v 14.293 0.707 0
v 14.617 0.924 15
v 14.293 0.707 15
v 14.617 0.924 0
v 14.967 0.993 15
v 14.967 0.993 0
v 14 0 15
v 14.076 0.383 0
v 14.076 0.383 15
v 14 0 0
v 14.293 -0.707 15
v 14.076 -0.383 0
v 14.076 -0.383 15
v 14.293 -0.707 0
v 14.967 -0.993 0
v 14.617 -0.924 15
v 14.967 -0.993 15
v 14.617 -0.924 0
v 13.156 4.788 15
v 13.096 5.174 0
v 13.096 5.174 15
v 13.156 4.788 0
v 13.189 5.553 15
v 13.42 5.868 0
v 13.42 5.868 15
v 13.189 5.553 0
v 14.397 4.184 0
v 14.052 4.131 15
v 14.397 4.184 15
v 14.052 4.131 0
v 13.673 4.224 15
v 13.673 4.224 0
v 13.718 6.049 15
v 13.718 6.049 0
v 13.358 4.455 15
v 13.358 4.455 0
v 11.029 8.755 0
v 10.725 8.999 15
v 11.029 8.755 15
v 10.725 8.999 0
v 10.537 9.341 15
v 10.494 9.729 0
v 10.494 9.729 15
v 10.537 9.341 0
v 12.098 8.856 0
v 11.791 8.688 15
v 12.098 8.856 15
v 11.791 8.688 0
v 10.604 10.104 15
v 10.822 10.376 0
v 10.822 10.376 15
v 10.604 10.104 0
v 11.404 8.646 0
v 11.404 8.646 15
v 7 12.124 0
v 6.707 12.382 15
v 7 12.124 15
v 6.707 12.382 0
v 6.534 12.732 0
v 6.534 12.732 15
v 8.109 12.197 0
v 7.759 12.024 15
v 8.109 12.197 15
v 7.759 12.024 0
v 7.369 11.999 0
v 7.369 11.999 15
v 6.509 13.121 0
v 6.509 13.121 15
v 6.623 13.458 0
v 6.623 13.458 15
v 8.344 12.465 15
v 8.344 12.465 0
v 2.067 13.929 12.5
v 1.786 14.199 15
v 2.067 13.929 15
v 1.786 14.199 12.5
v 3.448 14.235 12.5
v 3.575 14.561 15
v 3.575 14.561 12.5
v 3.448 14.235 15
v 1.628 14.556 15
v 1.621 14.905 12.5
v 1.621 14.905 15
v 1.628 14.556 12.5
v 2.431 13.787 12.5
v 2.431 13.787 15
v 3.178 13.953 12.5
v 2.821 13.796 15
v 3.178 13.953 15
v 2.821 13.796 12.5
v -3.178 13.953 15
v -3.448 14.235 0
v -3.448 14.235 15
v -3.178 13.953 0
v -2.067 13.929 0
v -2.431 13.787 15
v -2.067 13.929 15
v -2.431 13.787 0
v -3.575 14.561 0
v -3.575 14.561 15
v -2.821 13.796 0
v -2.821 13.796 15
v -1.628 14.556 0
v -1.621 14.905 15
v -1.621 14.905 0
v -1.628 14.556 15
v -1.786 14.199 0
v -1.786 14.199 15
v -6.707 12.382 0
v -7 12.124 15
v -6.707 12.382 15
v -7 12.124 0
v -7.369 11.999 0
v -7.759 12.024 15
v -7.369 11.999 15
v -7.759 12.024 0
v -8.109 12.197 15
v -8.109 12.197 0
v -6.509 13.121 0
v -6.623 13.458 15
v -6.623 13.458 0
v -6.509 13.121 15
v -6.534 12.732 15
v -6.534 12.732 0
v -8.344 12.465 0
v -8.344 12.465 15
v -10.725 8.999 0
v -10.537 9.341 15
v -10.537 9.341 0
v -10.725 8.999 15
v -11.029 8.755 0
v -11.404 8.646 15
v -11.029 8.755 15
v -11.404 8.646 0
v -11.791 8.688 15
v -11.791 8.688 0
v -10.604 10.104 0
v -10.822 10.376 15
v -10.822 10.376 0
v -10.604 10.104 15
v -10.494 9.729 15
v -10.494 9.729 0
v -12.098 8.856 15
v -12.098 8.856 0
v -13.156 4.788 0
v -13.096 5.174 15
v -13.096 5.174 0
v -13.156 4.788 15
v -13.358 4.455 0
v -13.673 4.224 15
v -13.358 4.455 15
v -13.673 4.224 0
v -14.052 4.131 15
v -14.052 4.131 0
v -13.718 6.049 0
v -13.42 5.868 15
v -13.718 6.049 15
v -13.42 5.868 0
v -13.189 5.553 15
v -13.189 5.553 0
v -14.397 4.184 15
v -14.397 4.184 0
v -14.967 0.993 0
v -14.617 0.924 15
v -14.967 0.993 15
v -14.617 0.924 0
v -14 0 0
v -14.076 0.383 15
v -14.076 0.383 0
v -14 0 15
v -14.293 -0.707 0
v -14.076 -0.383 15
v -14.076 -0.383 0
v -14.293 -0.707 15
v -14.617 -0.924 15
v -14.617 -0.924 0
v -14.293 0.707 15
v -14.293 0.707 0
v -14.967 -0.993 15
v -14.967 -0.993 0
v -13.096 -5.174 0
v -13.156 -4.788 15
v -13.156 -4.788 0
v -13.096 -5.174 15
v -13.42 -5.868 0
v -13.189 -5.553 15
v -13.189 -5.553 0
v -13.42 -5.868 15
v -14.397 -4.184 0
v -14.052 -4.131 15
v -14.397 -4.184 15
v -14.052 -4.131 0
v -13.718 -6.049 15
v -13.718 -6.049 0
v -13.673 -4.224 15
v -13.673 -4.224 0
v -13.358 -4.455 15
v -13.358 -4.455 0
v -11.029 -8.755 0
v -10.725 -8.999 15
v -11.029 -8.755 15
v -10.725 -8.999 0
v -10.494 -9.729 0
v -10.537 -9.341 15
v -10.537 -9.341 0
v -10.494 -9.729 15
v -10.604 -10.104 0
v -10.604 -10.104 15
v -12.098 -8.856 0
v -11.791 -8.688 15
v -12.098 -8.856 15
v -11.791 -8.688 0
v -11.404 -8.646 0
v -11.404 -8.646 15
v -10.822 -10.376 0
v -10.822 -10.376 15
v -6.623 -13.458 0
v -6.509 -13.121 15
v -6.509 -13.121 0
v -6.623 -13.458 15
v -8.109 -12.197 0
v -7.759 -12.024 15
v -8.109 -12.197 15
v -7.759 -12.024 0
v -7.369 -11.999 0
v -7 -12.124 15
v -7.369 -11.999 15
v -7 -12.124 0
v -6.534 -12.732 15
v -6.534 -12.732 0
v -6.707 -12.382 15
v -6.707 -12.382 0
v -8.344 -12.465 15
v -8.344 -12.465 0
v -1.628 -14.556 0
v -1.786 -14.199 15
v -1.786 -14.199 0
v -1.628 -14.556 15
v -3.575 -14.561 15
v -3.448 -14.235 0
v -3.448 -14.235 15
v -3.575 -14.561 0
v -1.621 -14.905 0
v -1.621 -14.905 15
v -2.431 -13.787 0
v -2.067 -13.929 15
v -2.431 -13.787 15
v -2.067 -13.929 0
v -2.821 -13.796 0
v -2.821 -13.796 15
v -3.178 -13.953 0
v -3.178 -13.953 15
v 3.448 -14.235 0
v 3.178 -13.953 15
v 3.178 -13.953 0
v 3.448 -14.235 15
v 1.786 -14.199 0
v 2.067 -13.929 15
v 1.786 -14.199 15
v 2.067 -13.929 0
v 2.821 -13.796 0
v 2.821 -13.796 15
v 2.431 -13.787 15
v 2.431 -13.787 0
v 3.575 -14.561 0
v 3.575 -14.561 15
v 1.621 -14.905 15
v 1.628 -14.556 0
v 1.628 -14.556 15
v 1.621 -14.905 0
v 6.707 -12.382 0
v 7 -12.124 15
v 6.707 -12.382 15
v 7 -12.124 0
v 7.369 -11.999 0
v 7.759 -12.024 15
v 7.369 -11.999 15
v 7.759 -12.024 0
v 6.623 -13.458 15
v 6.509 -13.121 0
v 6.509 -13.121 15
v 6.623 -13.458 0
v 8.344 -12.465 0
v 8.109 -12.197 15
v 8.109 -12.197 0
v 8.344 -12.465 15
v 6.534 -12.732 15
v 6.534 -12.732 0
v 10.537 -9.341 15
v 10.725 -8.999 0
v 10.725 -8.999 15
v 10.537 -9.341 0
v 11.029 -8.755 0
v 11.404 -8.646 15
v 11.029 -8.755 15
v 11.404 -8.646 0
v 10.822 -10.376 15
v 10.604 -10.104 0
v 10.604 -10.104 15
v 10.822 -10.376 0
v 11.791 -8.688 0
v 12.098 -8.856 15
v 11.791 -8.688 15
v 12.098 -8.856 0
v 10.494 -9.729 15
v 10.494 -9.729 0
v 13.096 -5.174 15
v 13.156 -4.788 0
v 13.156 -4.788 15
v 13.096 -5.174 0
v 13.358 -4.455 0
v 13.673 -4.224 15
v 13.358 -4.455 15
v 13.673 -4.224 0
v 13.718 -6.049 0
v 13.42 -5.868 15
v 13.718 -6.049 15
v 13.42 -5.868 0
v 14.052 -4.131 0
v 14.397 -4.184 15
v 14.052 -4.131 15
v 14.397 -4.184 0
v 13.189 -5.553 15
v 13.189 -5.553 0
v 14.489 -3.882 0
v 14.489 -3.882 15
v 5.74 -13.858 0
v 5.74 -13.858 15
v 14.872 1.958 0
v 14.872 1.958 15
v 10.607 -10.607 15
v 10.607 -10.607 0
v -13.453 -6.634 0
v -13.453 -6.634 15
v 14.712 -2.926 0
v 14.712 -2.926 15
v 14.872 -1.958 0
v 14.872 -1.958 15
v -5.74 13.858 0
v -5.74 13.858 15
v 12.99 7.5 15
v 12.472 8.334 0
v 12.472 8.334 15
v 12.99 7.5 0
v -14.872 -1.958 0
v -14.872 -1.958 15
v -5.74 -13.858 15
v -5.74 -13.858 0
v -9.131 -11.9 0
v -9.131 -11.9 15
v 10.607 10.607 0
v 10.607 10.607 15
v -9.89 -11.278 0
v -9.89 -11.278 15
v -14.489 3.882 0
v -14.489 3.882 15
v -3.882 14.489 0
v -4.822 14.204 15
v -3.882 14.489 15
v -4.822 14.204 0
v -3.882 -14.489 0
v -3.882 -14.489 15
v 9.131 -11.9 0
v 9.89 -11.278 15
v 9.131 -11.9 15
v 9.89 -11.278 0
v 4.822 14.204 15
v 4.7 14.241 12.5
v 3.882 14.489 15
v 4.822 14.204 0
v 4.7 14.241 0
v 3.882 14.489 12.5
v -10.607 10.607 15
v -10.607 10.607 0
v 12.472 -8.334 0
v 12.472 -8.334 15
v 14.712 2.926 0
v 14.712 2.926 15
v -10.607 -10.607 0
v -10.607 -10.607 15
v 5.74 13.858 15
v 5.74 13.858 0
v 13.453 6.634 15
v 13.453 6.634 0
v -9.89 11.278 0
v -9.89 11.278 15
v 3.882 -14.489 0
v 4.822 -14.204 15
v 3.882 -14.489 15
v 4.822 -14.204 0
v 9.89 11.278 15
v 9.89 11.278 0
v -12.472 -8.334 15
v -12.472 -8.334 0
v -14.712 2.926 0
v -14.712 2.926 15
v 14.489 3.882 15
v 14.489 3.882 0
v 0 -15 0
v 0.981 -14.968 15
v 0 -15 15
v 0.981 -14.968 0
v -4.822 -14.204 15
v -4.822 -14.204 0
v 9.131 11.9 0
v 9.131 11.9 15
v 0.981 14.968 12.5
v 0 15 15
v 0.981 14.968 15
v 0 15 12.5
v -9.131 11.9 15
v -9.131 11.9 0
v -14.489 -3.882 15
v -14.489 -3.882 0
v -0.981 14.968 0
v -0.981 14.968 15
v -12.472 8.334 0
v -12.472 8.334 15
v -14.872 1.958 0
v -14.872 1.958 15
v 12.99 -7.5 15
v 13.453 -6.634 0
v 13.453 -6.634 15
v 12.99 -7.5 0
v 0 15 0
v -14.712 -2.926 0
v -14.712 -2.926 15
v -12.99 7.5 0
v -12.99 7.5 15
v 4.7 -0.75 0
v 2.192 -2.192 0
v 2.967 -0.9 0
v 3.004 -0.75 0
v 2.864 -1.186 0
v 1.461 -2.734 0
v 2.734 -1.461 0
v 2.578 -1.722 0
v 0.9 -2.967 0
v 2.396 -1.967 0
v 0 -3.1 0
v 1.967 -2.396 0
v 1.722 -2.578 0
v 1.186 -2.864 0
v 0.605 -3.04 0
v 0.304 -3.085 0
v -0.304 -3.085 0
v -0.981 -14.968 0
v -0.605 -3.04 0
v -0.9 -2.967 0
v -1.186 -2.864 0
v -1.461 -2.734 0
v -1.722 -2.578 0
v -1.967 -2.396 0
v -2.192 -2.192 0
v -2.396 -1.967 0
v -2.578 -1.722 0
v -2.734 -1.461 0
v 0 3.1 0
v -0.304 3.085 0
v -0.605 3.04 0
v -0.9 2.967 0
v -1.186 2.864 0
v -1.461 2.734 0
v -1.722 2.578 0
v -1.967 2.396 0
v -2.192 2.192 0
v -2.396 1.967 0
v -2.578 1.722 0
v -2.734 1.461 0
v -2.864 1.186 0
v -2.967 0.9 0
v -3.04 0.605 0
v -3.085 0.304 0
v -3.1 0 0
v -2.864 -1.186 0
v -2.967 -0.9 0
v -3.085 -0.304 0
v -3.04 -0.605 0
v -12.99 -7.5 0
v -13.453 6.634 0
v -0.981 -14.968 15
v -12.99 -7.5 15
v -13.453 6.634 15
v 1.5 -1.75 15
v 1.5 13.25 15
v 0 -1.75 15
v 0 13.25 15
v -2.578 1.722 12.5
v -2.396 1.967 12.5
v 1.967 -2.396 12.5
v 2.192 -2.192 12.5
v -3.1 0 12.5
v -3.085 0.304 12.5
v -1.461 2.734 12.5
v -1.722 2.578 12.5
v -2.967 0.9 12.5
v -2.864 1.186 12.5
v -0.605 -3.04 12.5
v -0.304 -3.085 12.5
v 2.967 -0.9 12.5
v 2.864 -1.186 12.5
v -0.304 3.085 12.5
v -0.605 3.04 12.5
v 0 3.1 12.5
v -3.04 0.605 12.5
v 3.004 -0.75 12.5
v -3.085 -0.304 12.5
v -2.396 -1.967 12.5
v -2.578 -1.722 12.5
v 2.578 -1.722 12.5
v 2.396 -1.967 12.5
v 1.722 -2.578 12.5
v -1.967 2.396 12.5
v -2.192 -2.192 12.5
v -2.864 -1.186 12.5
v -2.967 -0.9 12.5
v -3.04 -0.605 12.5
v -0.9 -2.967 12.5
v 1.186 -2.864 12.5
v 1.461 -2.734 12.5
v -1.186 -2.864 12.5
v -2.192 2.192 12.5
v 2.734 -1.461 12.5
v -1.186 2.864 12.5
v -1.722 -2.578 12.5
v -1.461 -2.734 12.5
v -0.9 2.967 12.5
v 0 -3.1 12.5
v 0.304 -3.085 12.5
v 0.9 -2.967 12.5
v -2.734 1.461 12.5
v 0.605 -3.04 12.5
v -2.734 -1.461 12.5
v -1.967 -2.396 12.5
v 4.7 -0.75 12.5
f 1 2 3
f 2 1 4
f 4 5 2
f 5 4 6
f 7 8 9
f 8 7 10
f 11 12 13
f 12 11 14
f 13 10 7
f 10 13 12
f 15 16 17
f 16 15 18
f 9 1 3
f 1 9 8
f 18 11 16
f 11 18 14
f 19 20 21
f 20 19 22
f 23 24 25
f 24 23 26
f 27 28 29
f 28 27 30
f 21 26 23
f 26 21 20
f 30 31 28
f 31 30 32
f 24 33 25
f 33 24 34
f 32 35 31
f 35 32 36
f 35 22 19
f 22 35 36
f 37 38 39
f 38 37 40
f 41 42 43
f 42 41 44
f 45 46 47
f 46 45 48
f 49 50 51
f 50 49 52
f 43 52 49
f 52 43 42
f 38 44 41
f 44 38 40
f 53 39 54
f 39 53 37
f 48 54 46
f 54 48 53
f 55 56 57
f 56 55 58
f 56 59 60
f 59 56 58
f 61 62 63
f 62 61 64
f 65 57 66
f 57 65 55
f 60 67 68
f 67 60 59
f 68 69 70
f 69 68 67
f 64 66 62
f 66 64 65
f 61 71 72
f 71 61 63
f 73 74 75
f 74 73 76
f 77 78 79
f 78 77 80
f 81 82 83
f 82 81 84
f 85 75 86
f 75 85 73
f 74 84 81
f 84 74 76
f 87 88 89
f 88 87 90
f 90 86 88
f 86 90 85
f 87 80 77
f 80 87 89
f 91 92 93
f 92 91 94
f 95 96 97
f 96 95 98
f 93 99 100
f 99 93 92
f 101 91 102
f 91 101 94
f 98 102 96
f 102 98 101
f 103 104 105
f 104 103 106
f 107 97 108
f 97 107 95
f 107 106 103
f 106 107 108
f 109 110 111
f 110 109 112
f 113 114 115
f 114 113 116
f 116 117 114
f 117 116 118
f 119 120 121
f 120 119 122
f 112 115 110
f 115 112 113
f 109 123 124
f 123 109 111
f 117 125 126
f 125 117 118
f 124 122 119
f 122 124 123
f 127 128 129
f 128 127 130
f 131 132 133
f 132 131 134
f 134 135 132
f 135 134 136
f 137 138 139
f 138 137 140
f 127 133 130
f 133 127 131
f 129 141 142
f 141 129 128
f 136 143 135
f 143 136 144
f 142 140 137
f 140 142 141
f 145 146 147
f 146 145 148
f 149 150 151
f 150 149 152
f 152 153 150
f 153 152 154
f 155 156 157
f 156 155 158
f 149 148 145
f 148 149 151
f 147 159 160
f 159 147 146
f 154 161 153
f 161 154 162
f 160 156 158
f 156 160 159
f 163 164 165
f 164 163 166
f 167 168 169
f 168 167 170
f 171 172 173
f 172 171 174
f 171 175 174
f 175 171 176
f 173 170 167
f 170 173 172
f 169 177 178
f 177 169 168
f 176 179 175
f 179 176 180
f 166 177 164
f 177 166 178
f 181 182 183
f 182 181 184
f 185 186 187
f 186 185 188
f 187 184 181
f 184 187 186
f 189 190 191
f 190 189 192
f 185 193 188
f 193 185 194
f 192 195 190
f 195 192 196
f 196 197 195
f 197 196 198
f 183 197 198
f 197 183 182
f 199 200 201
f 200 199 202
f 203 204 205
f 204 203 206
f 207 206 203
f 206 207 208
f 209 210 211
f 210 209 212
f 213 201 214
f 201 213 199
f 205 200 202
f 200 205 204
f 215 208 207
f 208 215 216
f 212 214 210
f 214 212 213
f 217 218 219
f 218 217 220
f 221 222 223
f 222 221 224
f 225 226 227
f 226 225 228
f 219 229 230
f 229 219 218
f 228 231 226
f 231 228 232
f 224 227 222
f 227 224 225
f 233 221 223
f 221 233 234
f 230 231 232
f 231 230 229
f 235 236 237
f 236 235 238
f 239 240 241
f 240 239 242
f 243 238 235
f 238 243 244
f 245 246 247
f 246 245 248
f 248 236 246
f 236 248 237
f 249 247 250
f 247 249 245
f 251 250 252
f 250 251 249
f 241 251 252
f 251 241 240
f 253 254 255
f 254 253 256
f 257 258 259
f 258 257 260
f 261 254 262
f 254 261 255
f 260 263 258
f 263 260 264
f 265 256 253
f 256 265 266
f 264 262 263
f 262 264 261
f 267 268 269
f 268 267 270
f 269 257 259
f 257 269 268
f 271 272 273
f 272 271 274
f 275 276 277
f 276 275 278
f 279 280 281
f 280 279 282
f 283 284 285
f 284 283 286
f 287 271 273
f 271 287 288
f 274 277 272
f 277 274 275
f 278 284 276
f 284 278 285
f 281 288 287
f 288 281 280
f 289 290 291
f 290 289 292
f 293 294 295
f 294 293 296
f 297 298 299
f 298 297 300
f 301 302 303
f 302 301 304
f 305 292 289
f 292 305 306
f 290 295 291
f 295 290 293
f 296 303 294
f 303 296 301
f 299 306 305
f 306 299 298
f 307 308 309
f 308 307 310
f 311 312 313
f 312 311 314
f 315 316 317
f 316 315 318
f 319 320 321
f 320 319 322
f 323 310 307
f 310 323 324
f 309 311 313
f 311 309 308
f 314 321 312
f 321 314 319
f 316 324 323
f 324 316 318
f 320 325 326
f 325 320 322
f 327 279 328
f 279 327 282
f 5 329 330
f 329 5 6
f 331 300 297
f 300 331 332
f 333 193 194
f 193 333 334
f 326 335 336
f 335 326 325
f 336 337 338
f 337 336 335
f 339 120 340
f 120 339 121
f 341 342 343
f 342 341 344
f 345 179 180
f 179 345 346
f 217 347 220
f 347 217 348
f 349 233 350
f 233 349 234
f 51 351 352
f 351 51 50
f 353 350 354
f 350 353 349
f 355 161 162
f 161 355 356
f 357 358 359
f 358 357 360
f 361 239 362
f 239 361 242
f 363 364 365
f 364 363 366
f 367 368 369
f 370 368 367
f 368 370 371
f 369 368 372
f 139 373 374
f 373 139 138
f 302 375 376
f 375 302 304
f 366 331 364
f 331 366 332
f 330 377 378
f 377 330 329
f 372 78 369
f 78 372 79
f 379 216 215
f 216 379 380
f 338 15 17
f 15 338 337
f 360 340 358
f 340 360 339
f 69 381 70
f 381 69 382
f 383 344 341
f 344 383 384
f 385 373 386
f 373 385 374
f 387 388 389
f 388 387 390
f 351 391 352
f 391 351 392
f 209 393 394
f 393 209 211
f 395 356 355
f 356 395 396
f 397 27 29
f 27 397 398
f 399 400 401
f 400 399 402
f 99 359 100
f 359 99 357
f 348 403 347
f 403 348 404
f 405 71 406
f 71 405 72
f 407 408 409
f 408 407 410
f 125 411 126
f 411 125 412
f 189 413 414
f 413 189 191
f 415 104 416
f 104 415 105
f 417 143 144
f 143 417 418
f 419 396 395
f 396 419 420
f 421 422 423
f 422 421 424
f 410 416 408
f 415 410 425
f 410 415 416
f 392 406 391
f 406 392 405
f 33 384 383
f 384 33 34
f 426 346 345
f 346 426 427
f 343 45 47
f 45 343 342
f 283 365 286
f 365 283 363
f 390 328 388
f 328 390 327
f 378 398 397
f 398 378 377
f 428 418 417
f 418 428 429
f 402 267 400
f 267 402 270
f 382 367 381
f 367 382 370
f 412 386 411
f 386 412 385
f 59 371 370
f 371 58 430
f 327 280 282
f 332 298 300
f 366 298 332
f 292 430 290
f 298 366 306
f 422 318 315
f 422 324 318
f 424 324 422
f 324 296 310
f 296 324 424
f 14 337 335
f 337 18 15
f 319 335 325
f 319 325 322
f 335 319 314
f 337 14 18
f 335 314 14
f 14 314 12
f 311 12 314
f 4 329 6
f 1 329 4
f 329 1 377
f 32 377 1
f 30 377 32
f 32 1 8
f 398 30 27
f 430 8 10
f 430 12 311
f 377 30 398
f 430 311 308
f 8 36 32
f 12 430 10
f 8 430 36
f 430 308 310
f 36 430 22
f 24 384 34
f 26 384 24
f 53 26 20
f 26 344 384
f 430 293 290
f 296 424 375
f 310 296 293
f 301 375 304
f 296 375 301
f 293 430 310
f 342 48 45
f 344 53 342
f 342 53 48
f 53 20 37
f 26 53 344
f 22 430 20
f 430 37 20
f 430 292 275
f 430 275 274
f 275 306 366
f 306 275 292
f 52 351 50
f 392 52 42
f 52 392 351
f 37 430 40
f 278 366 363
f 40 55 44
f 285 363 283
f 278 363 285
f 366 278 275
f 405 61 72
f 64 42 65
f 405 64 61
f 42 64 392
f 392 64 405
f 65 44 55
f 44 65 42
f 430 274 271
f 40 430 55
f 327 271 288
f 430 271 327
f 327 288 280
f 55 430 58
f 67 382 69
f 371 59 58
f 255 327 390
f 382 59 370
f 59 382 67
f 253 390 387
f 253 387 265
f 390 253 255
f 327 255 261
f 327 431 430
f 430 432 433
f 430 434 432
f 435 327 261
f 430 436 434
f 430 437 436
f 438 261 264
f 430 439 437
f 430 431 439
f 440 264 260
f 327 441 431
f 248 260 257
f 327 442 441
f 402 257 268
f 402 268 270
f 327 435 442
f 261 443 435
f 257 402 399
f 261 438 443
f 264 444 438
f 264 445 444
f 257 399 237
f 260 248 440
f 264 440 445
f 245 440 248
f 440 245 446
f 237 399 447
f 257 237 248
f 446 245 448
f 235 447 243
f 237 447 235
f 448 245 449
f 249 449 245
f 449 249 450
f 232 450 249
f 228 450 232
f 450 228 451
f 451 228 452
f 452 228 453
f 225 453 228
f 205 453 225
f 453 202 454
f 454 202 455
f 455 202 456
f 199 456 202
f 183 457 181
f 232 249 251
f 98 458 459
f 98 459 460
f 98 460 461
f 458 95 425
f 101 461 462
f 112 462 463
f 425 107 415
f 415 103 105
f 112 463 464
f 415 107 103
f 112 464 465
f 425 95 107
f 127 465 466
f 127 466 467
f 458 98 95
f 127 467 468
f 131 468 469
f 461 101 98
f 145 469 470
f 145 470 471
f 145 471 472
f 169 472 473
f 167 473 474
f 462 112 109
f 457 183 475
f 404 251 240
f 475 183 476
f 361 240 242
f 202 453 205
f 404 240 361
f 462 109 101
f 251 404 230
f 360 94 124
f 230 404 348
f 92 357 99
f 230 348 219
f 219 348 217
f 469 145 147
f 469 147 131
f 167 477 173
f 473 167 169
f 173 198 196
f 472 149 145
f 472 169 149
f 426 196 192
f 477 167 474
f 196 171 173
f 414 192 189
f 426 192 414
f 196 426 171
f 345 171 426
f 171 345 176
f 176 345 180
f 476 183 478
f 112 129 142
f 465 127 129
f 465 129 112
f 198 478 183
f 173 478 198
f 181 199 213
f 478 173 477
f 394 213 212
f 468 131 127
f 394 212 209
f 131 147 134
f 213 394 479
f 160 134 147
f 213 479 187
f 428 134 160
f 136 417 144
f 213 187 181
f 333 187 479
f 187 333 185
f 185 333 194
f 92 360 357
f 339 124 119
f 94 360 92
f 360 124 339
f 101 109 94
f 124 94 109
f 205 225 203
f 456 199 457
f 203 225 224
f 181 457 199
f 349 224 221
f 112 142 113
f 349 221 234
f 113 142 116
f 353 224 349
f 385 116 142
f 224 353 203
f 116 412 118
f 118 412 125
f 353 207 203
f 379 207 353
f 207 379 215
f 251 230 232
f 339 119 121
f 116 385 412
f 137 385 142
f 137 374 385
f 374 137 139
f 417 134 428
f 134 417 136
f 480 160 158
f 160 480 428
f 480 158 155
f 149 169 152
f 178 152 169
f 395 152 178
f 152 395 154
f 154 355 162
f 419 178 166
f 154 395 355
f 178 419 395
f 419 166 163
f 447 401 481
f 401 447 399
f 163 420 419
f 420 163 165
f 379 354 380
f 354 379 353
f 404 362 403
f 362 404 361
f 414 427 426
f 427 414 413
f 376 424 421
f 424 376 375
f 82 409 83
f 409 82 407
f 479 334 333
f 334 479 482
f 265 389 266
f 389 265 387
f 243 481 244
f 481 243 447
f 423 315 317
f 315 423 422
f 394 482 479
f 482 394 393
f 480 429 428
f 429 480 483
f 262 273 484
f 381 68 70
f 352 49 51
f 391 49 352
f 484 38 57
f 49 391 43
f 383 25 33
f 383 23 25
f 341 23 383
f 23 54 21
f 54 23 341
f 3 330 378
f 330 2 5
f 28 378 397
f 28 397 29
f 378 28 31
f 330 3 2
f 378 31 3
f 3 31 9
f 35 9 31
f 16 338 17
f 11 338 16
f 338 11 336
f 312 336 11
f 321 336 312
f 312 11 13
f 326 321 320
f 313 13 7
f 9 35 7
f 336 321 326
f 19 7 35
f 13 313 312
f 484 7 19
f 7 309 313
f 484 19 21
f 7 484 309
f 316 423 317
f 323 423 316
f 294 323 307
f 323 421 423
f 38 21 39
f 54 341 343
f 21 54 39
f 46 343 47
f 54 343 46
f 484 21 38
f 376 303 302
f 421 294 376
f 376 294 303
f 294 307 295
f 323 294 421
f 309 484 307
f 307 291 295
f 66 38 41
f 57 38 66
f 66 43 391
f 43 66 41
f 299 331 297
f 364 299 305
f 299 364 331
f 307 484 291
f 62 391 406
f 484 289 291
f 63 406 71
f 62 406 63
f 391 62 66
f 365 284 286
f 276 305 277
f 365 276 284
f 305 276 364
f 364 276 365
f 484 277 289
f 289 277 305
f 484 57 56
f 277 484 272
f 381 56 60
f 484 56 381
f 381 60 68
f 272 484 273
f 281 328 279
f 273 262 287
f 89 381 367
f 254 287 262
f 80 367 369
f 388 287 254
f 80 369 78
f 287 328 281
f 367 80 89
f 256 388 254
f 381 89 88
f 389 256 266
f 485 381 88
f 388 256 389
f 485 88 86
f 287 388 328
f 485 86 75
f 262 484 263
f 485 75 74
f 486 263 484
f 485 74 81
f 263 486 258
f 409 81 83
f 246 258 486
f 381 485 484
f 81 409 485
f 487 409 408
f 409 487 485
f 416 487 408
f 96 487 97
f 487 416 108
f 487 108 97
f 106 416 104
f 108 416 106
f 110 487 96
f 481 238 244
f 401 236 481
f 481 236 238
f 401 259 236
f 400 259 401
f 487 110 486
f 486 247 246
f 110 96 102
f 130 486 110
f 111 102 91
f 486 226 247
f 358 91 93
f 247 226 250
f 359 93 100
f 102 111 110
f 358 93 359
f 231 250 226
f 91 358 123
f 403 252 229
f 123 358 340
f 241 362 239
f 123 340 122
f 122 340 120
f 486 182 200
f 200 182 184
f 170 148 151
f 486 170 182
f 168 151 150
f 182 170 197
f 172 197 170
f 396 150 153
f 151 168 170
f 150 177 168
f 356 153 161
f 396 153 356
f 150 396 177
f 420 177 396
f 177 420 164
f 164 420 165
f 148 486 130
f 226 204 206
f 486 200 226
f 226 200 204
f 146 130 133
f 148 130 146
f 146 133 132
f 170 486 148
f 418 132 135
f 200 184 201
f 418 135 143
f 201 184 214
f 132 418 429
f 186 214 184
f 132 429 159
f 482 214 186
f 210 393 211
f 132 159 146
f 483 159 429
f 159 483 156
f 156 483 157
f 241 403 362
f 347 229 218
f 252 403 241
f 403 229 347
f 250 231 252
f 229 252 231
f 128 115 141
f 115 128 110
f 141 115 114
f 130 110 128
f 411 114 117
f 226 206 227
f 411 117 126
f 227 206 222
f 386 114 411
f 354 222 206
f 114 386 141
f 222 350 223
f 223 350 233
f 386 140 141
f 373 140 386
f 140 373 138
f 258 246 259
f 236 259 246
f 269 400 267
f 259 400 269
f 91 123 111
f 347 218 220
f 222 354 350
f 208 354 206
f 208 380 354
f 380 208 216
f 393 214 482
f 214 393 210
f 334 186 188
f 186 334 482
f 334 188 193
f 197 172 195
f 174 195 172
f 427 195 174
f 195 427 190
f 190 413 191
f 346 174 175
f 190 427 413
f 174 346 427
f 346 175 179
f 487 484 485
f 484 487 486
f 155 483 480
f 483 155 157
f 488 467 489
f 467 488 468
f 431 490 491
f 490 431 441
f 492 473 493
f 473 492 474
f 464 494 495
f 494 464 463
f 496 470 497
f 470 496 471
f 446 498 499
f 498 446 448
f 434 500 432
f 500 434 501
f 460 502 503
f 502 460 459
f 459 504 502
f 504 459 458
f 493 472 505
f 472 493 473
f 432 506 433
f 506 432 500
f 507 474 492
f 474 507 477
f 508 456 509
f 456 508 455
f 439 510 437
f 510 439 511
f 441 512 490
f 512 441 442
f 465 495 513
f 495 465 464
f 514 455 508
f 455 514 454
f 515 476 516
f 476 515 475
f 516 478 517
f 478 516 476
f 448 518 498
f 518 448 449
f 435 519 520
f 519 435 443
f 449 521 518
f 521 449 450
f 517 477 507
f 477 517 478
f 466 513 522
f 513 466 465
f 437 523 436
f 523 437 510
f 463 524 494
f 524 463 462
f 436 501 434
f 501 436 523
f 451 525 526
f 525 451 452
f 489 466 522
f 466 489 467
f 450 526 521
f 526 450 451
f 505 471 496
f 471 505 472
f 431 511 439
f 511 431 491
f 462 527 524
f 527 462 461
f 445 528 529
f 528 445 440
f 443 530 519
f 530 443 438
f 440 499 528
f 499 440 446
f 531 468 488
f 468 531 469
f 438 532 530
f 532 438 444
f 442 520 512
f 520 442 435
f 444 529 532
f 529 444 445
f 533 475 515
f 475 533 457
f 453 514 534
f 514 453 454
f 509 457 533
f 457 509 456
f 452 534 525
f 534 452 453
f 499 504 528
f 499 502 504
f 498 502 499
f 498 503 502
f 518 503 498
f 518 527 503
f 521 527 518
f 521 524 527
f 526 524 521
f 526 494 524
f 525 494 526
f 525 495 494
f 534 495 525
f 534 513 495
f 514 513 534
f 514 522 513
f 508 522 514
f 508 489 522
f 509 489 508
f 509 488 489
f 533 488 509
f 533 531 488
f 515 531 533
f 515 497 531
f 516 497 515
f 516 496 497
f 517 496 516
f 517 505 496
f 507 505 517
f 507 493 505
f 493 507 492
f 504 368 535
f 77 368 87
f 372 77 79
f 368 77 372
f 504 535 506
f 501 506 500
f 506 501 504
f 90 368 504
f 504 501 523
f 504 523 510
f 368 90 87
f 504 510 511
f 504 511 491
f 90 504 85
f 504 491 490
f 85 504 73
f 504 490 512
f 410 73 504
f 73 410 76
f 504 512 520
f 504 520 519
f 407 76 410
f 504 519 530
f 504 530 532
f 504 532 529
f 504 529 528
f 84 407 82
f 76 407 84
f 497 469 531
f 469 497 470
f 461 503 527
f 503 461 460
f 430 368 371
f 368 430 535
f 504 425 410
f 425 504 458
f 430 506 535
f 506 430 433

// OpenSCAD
// Replacement knob for a hotplate stirrer with a 6 mm D-shaft
// Print orientation: bottom face (facing the hotplate) on the bed at z = 0

// ---------------- Parameters ----------------
knob_d      = 30;    // knob outer diameter (mm)
knob_h      = 15;    // knob height (mm)

bore_depth  = 12;    // D-bore depth from bottom face (mm)
bore_w      = 4.7;   // D-bore width: flat to opposite side of circle (mm)
bore_d      = 6.2;   // diameter of the circle the D-bore is cut from (mm)

groove_n    = 18;    // number of vertical grip grooves
groove_d    = 2;     // grip groove diameter (mm)

pointer_w   = 1.5;   // pointer groove width (mm)
pointer_d   = 1;     // pointer groove depth (mm)

eps         = 0.5;   // overcut so cutting shapes pass beyond faces (mm)

$fn = 96;            // circle resolution

// ---------------- Derived ----------------
// Distance from the D-bore flat to the axis of the 6.2 mm circle.
// The flat runs through the circle at this offset, giving a chord of bore_w.
bore_offset = (bore_d - bore_w) / 2;

// ---------------- Model ----------------
difference() {
    // Main knob body
    translate([0, 0, 0])
        cylinder(d = knob_d, h = knob_h);

    // D-shaped blind bore from the bottom face, open upward
    translate([0, 0, -eps])
        linear_extrude(height = bore_depth + 2 * eps)
            circle(d = bore_d, $fn = 64);
    // Cut the flat side of the D
    translate([0, -bore_offset, -eps])
        cube([bore_w, knob_d, bore_depth + 2 * eps]);

    // 18 evenly spaced vertical grip grooves along the full height
    for (i = [0 : groove_n - 1])
        rotate([0, 0, i * 360 / groove_n])
            translate([knob_d / 2, 0, -eps])
                cylinder(d = groove_d, h = knob_h + 2 * eps, $fn = 16);

    // Pointer groove on the top face, on the same side as the D flat
    translate([0, -bore_offset - 1, knob_h])
        cube([pointer_w, knob_d / 2, pointer_d]);
}
